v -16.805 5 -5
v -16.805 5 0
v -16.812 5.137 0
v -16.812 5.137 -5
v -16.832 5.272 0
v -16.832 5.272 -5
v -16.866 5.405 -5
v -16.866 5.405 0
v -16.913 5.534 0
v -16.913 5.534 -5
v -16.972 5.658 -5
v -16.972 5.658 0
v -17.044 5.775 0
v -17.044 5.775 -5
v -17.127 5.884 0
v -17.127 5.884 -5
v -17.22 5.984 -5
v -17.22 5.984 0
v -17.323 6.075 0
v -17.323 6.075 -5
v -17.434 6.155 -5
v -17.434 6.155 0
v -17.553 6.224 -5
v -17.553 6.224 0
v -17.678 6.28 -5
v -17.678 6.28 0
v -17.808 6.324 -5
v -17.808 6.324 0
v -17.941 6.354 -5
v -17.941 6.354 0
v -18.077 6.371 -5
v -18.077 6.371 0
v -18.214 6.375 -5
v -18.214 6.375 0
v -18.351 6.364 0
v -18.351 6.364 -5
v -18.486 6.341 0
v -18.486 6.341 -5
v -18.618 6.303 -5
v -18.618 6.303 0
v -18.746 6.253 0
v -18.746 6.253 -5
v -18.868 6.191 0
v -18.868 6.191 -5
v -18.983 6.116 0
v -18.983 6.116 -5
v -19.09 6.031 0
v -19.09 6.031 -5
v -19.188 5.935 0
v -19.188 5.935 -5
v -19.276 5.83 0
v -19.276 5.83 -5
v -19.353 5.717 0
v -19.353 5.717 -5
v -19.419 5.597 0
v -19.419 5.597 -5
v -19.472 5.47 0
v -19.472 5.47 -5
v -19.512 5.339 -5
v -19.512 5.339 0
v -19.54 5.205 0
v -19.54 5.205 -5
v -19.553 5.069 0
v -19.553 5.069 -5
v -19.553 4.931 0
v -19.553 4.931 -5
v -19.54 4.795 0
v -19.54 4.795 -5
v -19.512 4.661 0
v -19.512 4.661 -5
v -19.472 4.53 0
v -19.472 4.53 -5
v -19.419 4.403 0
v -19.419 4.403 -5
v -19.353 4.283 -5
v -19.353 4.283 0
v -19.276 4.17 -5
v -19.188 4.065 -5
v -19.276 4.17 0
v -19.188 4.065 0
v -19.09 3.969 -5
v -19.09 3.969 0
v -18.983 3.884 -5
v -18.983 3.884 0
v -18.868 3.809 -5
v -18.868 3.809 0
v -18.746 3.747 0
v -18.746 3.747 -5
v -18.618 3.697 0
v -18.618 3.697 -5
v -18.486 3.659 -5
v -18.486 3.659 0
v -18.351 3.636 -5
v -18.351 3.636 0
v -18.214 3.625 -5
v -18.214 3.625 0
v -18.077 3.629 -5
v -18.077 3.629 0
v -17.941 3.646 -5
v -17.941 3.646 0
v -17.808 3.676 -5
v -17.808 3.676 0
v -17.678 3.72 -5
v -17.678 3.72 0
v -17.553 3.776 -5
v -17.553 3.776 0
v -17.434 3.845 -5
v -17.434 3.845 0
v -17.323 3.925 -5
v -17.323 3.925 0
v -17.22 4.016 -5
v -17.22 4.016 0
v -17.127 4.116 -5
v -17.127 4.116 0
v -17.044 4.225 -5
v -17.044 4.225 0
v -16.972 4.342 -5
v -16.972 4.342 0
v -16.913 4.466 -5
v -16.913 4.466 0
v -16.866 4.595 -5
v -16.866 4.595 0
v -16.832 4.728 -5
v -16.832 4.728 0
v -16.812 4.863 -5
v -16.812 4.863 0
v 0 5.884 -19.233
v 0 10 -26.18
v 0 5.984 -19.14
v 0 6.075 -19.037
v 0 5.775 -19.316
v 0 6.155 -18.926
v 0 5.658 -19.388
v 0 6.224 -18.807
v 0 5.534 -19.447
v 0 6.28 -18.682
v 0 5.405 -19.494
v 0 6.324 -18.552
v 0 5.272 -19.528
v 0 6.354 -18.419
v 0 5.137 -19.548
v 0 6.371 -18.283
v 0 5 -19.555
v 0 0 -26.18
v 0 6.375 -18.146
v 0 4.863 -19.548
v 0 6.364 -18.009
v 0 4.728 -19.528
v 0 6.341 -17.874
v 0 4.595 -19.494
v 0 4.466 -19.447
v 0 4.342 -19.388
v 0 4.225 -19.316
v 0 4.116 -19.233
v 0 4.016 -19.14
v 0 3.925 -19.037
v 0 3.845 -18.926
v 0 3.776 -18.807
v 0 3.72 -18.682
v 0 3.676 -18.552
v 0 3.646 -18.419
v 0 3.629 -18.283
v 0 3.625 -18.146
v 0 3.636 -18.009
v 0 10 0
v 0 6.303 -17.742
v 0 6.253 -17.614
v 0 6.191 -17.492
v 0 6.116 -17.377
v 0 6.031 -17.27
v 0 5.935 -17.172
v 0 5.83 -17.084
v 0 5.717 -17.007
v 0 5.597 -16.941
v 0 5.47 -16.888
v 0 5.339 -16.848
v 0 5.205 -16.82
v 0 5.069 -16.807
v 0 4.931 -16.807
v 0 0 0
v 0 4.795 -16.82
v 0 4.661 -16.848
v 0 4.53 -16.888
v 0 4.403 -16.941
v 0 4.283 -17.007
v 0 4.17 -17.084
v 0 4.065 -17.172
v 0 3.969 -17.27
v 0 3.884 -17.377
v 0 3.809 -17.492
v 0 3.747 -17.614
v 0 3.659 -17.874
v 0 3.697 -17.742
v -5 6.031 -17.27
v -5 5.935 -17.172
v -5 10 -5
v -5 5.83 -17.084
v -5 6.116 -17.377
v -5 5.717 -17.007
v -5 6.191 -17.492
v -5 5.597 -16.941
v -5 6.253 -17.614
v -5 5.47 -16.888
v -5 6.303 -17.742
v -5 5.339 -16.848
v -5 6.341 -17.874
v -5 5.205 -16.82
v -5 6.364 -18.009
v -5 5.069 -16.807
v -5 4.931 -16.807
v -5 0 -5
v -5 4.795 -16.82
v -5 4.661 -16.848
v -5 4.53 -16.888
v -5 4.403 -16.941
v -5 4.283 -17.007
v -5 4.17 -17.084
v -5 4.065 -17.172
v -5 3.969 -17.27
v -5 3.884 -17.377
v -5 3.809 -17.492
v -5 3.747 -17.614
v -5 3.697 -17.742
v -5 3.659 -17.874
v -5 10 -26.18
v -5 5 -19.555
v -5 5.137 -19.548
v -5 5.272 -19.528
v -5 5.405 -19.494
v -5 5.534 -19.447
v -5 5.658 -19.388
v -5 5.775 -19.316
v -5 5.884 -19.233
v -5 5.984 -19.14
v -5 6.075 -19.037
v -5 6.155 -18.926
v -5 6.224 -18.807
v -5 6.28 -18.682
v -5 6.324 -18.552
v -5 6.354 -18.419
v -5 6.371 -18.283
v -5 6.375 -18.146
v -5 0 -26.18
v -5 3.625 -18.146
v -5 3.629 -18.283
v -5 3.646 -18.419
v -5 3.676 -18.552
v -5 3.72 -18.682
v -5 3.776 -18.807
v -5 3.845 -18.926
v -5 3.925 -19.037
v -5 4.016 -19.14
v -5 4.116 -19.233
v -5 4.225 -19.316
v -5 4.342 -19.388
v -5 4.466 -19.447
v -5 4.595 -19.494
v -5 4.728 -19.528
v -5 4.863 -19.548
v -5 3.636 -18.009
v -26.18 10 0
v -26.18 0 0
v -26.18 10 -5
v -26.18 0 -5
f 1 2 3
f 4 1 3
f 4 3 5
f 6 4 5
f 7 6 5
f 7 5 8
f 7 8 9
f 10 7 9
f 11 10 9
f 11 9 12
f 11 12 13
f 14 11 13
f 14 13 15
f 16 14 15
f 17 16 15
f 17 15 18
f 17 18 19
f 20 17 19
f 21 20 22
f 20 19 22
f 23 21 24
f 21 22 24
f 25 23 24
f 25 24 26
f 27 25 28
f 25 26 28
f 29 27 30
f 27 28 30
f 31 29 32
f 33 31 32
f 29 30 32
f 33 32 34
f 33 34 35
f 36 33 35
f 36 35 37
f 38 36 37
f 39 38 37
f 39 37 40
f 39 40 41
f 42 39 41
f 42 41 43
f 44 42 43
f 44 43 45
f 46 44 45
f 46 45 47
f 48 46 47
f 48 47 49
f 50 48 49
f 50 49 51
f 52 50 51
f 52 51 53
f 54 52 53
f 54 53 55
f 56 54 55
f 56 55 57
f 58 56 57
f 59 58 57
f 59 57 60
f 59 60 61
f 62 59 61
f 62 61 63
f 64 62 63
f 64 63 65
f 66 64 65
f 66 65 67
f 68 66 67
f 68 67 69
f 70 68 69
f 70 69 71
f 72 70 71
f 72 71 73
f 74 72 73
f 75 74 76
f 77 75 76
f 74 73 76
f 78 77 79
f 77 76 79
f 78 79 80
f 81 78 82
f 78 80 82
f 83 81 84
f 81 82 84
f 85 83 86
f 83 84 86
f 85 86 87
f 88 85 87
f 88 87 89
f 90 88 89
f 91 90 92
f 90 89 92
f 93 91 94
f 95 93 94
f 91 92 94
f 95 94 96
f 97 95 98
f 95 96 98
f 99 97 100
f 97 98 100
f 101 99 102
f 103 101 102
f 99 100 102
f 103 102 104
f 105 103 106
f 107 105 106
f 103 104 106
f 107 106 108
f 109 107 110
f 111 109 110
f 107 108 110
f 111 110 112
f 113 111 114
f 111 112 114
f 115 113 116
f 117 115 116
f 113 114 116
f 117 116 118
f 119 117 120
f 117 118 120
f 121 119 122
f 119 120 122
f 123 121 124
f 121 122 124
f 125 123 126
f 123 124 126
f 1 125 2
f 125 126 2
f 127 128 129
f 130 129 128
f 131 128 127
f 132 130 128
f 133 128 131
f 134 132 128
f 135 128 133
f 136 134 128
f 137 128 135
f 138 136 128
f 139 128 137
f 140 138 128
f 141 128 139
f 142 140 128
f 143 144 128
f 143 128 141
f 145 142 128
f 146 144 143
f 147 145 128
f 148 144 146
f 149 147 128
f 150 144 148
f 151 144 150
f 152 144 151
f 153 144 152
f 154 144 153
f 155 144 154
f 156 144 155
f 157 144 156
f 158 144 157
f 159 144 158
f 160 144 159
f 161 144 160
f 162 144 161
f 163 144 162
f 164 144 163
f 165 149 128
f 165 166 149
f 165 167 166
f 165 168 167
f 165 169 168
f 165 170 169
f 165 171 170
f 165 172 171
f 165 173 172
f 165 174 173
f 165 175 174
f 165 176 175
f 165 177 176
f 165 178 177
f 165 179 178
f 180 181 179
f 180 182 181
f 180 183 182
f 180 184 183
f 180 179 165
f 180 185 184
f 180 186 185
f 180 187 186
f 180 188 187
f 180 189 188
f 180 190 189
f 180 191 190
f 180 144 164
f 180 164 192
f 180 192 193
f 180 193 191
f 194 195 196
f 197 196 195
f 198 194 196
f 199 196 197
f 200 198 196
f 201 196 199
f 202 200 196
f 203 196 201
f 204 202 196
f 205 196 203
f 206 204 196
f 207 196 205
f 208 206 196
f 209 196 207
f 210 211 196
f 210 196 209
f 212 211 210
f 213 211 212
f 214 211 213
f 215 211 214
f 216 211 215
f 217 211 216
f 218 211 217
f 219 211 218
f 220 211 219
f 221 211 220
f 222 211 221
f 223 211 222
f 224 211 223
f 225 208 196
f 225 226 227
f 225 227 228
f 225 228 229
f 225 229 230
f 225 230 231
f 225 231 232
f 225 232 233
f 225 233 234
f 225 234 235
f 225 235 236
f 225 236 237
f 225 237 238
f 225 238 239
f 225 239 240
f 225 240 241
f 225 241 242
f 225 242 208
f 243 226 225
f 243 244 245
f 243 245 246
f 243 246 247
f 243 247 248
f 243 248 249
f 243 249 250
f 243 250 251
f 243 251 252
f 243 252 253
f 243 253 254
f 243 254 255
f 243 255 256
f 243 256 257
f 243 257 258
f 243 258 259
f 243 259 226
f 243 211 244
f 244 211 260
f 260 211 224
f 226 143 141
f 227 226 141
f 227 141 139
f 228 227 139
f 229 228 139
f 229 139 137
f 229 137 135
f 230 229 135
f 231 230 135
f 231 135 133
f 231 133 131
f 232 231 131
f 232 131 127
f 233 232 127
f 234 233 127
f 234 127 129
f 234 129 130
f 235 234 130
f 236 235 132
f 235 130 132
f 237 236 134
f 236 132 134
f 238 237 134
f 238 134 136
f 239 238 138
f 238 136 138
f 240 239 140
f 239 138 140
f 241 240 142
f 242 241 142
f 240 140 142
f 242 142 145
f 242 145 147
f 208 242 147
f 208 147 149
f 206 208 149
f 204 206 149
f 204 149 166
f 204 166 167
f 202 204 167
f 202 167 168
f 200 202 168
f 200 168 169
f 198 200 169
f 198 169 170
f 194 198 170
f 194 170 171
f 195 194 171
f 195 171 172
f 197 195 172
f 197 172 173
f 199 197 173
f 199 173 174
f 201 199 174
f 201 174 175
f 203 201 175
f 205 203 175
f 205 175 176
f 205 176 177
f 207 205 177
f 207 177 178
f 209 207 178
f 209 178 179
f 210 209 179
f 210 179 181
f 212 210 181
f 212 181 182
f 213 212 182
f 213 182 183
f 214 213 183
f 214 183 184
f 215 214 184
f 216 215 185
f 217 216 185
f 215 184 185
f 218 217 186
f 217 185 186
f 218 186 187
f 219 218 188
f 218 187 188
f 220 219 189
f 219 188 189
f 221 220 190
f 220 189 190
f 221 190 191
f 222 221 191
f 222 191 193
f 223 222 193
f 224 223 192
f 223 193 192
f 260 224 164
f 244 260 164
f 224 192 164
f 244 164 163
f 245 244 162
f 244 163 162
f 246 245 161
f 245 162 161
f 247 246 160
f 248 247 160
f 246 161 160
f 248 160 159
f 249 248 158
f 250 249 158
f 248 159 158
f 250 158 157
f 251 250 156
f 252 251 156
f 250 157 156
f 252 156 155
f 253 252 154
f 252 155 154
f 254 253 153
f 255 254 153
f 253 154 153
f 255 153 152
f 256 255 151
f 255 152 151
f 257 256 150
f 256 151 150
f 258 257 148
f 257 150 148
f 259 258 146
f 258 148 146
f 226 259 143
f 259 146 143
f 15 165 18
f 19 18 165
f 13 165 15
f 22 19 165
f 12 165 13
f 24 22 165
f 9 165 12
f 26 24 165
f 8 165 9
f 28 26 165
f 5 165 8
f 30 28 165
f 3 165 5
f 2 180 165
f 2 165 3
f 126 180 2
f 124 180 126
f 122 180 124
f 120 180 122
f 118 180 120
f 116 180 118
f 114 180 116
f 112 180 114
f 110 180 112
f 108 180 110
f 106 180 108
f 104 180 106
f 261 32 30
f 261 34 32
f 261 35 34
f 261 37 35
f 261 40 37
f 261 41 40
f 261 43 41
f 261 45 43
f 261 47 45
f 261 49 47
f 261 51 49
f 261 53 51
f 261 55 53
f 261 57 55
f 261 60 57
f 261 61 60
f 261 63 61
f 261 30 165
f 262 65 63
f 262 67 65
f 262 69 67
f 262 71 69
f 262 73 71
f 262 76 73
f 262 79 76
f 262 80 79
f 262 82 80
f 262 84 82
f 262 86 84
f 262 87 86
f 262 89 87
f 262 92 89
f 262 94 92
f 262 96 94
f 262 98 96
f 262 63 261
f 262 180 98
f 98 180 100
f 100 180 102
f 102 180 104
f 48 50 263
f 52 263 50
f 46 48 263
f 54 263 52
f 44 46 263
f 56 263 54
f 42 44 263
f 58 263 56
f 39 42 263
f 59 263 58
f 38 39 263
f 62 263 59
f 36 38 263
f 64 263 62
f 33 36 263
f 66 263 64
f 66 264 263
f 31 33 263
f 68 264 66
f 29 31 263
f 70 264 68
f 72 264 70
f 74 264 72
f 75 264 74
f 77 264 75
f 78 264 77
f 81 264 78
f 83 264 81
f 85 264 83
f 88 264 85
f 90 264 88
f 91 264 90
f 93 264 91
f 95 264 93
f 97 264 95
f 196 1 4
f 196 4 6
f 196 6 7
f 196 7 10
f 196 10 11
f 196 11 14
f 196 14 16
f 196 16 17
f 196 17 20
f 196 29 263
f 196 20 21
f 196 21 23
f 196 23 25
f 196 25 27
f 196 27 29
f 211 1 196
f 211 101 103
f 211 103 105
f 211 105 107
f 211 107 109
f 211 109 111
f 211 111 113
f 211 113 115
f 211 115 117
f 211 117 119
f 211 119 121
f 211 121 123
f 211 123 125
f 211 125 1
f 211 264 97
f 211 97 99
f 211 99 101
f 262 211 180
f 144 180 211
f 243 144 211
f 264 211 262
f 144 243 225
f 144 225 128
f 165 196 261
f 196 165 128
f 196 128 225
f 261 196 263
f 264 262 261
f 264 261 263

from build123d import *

# Parameters (mm, degrees)
BOSS_EXTRUDE1_DEPTH = 10
CUT_EXTRUDE2_REACH  = 40.351
SKETCH3_R           = 1.375
CUT_EXTRUDE3_REACH  = 40.351
SKETCH4_R           = 1.375


with BuildPart() as part:
    # Sketch2 → Boss-Extrude1 (new body)
    with BuildSketch(Plane(origin=(0, 0, 0), x_dir=(1, 0, 0), z_dir=(0, 1, 0))):
        Polygon((0, 0), (-26.18, 0), (-26.18, 5), (-5, 5), (-5, 26.18), (0, 26.18), align=None)
    extrude(amount=BOSS_EXTRUDE1_DEPTH)

    # Sketch3 → Cut-Extrude2 (cut, up to next)
    with BuildSketch(Plane.XY, mode=Mode.PRIVATE) as cut_extrude2_sk1:
        with Locations((-18.18, 5)):
            Circle(SKETCH3_R)
    cut_extrude2_tool1 = extrude(cut_extrude2_sk1.sketch, amount=-CUT_EXTRUDE2_REACH, mode=Mode.PRIVATE) & part.part
    add(cut_extrude2_tool1.solids().sort_by_distance((-18.18, 5, 0))[0], mode=Mode.SUBTRACT)

    # Sketch4 → Cut-Extrude3 (cut, up to next)
    with BuildSketch(Plane(origin=(0, 0, 0), x_dir=(0, 0, -1), z_dir=(1, 0, 0)), mode=Mode.PRIVATE) as cut_extrude3_sk1:
        with Locations((18.18, 5)):
            Circle(SKETCH4_R)
    cut_extrude3_tool1 = extrude(cut_extrude3_sk1.sketch, amount=-CUT_EXTRUDE3_REACH, mode=Mode.PRIVATE) & part.part
    add(cut_extrude3_tool1.solids().sort_by_distance((0, 5, -18.18))[0], mode=Mode.SUBTRACT)


solid = part.part
